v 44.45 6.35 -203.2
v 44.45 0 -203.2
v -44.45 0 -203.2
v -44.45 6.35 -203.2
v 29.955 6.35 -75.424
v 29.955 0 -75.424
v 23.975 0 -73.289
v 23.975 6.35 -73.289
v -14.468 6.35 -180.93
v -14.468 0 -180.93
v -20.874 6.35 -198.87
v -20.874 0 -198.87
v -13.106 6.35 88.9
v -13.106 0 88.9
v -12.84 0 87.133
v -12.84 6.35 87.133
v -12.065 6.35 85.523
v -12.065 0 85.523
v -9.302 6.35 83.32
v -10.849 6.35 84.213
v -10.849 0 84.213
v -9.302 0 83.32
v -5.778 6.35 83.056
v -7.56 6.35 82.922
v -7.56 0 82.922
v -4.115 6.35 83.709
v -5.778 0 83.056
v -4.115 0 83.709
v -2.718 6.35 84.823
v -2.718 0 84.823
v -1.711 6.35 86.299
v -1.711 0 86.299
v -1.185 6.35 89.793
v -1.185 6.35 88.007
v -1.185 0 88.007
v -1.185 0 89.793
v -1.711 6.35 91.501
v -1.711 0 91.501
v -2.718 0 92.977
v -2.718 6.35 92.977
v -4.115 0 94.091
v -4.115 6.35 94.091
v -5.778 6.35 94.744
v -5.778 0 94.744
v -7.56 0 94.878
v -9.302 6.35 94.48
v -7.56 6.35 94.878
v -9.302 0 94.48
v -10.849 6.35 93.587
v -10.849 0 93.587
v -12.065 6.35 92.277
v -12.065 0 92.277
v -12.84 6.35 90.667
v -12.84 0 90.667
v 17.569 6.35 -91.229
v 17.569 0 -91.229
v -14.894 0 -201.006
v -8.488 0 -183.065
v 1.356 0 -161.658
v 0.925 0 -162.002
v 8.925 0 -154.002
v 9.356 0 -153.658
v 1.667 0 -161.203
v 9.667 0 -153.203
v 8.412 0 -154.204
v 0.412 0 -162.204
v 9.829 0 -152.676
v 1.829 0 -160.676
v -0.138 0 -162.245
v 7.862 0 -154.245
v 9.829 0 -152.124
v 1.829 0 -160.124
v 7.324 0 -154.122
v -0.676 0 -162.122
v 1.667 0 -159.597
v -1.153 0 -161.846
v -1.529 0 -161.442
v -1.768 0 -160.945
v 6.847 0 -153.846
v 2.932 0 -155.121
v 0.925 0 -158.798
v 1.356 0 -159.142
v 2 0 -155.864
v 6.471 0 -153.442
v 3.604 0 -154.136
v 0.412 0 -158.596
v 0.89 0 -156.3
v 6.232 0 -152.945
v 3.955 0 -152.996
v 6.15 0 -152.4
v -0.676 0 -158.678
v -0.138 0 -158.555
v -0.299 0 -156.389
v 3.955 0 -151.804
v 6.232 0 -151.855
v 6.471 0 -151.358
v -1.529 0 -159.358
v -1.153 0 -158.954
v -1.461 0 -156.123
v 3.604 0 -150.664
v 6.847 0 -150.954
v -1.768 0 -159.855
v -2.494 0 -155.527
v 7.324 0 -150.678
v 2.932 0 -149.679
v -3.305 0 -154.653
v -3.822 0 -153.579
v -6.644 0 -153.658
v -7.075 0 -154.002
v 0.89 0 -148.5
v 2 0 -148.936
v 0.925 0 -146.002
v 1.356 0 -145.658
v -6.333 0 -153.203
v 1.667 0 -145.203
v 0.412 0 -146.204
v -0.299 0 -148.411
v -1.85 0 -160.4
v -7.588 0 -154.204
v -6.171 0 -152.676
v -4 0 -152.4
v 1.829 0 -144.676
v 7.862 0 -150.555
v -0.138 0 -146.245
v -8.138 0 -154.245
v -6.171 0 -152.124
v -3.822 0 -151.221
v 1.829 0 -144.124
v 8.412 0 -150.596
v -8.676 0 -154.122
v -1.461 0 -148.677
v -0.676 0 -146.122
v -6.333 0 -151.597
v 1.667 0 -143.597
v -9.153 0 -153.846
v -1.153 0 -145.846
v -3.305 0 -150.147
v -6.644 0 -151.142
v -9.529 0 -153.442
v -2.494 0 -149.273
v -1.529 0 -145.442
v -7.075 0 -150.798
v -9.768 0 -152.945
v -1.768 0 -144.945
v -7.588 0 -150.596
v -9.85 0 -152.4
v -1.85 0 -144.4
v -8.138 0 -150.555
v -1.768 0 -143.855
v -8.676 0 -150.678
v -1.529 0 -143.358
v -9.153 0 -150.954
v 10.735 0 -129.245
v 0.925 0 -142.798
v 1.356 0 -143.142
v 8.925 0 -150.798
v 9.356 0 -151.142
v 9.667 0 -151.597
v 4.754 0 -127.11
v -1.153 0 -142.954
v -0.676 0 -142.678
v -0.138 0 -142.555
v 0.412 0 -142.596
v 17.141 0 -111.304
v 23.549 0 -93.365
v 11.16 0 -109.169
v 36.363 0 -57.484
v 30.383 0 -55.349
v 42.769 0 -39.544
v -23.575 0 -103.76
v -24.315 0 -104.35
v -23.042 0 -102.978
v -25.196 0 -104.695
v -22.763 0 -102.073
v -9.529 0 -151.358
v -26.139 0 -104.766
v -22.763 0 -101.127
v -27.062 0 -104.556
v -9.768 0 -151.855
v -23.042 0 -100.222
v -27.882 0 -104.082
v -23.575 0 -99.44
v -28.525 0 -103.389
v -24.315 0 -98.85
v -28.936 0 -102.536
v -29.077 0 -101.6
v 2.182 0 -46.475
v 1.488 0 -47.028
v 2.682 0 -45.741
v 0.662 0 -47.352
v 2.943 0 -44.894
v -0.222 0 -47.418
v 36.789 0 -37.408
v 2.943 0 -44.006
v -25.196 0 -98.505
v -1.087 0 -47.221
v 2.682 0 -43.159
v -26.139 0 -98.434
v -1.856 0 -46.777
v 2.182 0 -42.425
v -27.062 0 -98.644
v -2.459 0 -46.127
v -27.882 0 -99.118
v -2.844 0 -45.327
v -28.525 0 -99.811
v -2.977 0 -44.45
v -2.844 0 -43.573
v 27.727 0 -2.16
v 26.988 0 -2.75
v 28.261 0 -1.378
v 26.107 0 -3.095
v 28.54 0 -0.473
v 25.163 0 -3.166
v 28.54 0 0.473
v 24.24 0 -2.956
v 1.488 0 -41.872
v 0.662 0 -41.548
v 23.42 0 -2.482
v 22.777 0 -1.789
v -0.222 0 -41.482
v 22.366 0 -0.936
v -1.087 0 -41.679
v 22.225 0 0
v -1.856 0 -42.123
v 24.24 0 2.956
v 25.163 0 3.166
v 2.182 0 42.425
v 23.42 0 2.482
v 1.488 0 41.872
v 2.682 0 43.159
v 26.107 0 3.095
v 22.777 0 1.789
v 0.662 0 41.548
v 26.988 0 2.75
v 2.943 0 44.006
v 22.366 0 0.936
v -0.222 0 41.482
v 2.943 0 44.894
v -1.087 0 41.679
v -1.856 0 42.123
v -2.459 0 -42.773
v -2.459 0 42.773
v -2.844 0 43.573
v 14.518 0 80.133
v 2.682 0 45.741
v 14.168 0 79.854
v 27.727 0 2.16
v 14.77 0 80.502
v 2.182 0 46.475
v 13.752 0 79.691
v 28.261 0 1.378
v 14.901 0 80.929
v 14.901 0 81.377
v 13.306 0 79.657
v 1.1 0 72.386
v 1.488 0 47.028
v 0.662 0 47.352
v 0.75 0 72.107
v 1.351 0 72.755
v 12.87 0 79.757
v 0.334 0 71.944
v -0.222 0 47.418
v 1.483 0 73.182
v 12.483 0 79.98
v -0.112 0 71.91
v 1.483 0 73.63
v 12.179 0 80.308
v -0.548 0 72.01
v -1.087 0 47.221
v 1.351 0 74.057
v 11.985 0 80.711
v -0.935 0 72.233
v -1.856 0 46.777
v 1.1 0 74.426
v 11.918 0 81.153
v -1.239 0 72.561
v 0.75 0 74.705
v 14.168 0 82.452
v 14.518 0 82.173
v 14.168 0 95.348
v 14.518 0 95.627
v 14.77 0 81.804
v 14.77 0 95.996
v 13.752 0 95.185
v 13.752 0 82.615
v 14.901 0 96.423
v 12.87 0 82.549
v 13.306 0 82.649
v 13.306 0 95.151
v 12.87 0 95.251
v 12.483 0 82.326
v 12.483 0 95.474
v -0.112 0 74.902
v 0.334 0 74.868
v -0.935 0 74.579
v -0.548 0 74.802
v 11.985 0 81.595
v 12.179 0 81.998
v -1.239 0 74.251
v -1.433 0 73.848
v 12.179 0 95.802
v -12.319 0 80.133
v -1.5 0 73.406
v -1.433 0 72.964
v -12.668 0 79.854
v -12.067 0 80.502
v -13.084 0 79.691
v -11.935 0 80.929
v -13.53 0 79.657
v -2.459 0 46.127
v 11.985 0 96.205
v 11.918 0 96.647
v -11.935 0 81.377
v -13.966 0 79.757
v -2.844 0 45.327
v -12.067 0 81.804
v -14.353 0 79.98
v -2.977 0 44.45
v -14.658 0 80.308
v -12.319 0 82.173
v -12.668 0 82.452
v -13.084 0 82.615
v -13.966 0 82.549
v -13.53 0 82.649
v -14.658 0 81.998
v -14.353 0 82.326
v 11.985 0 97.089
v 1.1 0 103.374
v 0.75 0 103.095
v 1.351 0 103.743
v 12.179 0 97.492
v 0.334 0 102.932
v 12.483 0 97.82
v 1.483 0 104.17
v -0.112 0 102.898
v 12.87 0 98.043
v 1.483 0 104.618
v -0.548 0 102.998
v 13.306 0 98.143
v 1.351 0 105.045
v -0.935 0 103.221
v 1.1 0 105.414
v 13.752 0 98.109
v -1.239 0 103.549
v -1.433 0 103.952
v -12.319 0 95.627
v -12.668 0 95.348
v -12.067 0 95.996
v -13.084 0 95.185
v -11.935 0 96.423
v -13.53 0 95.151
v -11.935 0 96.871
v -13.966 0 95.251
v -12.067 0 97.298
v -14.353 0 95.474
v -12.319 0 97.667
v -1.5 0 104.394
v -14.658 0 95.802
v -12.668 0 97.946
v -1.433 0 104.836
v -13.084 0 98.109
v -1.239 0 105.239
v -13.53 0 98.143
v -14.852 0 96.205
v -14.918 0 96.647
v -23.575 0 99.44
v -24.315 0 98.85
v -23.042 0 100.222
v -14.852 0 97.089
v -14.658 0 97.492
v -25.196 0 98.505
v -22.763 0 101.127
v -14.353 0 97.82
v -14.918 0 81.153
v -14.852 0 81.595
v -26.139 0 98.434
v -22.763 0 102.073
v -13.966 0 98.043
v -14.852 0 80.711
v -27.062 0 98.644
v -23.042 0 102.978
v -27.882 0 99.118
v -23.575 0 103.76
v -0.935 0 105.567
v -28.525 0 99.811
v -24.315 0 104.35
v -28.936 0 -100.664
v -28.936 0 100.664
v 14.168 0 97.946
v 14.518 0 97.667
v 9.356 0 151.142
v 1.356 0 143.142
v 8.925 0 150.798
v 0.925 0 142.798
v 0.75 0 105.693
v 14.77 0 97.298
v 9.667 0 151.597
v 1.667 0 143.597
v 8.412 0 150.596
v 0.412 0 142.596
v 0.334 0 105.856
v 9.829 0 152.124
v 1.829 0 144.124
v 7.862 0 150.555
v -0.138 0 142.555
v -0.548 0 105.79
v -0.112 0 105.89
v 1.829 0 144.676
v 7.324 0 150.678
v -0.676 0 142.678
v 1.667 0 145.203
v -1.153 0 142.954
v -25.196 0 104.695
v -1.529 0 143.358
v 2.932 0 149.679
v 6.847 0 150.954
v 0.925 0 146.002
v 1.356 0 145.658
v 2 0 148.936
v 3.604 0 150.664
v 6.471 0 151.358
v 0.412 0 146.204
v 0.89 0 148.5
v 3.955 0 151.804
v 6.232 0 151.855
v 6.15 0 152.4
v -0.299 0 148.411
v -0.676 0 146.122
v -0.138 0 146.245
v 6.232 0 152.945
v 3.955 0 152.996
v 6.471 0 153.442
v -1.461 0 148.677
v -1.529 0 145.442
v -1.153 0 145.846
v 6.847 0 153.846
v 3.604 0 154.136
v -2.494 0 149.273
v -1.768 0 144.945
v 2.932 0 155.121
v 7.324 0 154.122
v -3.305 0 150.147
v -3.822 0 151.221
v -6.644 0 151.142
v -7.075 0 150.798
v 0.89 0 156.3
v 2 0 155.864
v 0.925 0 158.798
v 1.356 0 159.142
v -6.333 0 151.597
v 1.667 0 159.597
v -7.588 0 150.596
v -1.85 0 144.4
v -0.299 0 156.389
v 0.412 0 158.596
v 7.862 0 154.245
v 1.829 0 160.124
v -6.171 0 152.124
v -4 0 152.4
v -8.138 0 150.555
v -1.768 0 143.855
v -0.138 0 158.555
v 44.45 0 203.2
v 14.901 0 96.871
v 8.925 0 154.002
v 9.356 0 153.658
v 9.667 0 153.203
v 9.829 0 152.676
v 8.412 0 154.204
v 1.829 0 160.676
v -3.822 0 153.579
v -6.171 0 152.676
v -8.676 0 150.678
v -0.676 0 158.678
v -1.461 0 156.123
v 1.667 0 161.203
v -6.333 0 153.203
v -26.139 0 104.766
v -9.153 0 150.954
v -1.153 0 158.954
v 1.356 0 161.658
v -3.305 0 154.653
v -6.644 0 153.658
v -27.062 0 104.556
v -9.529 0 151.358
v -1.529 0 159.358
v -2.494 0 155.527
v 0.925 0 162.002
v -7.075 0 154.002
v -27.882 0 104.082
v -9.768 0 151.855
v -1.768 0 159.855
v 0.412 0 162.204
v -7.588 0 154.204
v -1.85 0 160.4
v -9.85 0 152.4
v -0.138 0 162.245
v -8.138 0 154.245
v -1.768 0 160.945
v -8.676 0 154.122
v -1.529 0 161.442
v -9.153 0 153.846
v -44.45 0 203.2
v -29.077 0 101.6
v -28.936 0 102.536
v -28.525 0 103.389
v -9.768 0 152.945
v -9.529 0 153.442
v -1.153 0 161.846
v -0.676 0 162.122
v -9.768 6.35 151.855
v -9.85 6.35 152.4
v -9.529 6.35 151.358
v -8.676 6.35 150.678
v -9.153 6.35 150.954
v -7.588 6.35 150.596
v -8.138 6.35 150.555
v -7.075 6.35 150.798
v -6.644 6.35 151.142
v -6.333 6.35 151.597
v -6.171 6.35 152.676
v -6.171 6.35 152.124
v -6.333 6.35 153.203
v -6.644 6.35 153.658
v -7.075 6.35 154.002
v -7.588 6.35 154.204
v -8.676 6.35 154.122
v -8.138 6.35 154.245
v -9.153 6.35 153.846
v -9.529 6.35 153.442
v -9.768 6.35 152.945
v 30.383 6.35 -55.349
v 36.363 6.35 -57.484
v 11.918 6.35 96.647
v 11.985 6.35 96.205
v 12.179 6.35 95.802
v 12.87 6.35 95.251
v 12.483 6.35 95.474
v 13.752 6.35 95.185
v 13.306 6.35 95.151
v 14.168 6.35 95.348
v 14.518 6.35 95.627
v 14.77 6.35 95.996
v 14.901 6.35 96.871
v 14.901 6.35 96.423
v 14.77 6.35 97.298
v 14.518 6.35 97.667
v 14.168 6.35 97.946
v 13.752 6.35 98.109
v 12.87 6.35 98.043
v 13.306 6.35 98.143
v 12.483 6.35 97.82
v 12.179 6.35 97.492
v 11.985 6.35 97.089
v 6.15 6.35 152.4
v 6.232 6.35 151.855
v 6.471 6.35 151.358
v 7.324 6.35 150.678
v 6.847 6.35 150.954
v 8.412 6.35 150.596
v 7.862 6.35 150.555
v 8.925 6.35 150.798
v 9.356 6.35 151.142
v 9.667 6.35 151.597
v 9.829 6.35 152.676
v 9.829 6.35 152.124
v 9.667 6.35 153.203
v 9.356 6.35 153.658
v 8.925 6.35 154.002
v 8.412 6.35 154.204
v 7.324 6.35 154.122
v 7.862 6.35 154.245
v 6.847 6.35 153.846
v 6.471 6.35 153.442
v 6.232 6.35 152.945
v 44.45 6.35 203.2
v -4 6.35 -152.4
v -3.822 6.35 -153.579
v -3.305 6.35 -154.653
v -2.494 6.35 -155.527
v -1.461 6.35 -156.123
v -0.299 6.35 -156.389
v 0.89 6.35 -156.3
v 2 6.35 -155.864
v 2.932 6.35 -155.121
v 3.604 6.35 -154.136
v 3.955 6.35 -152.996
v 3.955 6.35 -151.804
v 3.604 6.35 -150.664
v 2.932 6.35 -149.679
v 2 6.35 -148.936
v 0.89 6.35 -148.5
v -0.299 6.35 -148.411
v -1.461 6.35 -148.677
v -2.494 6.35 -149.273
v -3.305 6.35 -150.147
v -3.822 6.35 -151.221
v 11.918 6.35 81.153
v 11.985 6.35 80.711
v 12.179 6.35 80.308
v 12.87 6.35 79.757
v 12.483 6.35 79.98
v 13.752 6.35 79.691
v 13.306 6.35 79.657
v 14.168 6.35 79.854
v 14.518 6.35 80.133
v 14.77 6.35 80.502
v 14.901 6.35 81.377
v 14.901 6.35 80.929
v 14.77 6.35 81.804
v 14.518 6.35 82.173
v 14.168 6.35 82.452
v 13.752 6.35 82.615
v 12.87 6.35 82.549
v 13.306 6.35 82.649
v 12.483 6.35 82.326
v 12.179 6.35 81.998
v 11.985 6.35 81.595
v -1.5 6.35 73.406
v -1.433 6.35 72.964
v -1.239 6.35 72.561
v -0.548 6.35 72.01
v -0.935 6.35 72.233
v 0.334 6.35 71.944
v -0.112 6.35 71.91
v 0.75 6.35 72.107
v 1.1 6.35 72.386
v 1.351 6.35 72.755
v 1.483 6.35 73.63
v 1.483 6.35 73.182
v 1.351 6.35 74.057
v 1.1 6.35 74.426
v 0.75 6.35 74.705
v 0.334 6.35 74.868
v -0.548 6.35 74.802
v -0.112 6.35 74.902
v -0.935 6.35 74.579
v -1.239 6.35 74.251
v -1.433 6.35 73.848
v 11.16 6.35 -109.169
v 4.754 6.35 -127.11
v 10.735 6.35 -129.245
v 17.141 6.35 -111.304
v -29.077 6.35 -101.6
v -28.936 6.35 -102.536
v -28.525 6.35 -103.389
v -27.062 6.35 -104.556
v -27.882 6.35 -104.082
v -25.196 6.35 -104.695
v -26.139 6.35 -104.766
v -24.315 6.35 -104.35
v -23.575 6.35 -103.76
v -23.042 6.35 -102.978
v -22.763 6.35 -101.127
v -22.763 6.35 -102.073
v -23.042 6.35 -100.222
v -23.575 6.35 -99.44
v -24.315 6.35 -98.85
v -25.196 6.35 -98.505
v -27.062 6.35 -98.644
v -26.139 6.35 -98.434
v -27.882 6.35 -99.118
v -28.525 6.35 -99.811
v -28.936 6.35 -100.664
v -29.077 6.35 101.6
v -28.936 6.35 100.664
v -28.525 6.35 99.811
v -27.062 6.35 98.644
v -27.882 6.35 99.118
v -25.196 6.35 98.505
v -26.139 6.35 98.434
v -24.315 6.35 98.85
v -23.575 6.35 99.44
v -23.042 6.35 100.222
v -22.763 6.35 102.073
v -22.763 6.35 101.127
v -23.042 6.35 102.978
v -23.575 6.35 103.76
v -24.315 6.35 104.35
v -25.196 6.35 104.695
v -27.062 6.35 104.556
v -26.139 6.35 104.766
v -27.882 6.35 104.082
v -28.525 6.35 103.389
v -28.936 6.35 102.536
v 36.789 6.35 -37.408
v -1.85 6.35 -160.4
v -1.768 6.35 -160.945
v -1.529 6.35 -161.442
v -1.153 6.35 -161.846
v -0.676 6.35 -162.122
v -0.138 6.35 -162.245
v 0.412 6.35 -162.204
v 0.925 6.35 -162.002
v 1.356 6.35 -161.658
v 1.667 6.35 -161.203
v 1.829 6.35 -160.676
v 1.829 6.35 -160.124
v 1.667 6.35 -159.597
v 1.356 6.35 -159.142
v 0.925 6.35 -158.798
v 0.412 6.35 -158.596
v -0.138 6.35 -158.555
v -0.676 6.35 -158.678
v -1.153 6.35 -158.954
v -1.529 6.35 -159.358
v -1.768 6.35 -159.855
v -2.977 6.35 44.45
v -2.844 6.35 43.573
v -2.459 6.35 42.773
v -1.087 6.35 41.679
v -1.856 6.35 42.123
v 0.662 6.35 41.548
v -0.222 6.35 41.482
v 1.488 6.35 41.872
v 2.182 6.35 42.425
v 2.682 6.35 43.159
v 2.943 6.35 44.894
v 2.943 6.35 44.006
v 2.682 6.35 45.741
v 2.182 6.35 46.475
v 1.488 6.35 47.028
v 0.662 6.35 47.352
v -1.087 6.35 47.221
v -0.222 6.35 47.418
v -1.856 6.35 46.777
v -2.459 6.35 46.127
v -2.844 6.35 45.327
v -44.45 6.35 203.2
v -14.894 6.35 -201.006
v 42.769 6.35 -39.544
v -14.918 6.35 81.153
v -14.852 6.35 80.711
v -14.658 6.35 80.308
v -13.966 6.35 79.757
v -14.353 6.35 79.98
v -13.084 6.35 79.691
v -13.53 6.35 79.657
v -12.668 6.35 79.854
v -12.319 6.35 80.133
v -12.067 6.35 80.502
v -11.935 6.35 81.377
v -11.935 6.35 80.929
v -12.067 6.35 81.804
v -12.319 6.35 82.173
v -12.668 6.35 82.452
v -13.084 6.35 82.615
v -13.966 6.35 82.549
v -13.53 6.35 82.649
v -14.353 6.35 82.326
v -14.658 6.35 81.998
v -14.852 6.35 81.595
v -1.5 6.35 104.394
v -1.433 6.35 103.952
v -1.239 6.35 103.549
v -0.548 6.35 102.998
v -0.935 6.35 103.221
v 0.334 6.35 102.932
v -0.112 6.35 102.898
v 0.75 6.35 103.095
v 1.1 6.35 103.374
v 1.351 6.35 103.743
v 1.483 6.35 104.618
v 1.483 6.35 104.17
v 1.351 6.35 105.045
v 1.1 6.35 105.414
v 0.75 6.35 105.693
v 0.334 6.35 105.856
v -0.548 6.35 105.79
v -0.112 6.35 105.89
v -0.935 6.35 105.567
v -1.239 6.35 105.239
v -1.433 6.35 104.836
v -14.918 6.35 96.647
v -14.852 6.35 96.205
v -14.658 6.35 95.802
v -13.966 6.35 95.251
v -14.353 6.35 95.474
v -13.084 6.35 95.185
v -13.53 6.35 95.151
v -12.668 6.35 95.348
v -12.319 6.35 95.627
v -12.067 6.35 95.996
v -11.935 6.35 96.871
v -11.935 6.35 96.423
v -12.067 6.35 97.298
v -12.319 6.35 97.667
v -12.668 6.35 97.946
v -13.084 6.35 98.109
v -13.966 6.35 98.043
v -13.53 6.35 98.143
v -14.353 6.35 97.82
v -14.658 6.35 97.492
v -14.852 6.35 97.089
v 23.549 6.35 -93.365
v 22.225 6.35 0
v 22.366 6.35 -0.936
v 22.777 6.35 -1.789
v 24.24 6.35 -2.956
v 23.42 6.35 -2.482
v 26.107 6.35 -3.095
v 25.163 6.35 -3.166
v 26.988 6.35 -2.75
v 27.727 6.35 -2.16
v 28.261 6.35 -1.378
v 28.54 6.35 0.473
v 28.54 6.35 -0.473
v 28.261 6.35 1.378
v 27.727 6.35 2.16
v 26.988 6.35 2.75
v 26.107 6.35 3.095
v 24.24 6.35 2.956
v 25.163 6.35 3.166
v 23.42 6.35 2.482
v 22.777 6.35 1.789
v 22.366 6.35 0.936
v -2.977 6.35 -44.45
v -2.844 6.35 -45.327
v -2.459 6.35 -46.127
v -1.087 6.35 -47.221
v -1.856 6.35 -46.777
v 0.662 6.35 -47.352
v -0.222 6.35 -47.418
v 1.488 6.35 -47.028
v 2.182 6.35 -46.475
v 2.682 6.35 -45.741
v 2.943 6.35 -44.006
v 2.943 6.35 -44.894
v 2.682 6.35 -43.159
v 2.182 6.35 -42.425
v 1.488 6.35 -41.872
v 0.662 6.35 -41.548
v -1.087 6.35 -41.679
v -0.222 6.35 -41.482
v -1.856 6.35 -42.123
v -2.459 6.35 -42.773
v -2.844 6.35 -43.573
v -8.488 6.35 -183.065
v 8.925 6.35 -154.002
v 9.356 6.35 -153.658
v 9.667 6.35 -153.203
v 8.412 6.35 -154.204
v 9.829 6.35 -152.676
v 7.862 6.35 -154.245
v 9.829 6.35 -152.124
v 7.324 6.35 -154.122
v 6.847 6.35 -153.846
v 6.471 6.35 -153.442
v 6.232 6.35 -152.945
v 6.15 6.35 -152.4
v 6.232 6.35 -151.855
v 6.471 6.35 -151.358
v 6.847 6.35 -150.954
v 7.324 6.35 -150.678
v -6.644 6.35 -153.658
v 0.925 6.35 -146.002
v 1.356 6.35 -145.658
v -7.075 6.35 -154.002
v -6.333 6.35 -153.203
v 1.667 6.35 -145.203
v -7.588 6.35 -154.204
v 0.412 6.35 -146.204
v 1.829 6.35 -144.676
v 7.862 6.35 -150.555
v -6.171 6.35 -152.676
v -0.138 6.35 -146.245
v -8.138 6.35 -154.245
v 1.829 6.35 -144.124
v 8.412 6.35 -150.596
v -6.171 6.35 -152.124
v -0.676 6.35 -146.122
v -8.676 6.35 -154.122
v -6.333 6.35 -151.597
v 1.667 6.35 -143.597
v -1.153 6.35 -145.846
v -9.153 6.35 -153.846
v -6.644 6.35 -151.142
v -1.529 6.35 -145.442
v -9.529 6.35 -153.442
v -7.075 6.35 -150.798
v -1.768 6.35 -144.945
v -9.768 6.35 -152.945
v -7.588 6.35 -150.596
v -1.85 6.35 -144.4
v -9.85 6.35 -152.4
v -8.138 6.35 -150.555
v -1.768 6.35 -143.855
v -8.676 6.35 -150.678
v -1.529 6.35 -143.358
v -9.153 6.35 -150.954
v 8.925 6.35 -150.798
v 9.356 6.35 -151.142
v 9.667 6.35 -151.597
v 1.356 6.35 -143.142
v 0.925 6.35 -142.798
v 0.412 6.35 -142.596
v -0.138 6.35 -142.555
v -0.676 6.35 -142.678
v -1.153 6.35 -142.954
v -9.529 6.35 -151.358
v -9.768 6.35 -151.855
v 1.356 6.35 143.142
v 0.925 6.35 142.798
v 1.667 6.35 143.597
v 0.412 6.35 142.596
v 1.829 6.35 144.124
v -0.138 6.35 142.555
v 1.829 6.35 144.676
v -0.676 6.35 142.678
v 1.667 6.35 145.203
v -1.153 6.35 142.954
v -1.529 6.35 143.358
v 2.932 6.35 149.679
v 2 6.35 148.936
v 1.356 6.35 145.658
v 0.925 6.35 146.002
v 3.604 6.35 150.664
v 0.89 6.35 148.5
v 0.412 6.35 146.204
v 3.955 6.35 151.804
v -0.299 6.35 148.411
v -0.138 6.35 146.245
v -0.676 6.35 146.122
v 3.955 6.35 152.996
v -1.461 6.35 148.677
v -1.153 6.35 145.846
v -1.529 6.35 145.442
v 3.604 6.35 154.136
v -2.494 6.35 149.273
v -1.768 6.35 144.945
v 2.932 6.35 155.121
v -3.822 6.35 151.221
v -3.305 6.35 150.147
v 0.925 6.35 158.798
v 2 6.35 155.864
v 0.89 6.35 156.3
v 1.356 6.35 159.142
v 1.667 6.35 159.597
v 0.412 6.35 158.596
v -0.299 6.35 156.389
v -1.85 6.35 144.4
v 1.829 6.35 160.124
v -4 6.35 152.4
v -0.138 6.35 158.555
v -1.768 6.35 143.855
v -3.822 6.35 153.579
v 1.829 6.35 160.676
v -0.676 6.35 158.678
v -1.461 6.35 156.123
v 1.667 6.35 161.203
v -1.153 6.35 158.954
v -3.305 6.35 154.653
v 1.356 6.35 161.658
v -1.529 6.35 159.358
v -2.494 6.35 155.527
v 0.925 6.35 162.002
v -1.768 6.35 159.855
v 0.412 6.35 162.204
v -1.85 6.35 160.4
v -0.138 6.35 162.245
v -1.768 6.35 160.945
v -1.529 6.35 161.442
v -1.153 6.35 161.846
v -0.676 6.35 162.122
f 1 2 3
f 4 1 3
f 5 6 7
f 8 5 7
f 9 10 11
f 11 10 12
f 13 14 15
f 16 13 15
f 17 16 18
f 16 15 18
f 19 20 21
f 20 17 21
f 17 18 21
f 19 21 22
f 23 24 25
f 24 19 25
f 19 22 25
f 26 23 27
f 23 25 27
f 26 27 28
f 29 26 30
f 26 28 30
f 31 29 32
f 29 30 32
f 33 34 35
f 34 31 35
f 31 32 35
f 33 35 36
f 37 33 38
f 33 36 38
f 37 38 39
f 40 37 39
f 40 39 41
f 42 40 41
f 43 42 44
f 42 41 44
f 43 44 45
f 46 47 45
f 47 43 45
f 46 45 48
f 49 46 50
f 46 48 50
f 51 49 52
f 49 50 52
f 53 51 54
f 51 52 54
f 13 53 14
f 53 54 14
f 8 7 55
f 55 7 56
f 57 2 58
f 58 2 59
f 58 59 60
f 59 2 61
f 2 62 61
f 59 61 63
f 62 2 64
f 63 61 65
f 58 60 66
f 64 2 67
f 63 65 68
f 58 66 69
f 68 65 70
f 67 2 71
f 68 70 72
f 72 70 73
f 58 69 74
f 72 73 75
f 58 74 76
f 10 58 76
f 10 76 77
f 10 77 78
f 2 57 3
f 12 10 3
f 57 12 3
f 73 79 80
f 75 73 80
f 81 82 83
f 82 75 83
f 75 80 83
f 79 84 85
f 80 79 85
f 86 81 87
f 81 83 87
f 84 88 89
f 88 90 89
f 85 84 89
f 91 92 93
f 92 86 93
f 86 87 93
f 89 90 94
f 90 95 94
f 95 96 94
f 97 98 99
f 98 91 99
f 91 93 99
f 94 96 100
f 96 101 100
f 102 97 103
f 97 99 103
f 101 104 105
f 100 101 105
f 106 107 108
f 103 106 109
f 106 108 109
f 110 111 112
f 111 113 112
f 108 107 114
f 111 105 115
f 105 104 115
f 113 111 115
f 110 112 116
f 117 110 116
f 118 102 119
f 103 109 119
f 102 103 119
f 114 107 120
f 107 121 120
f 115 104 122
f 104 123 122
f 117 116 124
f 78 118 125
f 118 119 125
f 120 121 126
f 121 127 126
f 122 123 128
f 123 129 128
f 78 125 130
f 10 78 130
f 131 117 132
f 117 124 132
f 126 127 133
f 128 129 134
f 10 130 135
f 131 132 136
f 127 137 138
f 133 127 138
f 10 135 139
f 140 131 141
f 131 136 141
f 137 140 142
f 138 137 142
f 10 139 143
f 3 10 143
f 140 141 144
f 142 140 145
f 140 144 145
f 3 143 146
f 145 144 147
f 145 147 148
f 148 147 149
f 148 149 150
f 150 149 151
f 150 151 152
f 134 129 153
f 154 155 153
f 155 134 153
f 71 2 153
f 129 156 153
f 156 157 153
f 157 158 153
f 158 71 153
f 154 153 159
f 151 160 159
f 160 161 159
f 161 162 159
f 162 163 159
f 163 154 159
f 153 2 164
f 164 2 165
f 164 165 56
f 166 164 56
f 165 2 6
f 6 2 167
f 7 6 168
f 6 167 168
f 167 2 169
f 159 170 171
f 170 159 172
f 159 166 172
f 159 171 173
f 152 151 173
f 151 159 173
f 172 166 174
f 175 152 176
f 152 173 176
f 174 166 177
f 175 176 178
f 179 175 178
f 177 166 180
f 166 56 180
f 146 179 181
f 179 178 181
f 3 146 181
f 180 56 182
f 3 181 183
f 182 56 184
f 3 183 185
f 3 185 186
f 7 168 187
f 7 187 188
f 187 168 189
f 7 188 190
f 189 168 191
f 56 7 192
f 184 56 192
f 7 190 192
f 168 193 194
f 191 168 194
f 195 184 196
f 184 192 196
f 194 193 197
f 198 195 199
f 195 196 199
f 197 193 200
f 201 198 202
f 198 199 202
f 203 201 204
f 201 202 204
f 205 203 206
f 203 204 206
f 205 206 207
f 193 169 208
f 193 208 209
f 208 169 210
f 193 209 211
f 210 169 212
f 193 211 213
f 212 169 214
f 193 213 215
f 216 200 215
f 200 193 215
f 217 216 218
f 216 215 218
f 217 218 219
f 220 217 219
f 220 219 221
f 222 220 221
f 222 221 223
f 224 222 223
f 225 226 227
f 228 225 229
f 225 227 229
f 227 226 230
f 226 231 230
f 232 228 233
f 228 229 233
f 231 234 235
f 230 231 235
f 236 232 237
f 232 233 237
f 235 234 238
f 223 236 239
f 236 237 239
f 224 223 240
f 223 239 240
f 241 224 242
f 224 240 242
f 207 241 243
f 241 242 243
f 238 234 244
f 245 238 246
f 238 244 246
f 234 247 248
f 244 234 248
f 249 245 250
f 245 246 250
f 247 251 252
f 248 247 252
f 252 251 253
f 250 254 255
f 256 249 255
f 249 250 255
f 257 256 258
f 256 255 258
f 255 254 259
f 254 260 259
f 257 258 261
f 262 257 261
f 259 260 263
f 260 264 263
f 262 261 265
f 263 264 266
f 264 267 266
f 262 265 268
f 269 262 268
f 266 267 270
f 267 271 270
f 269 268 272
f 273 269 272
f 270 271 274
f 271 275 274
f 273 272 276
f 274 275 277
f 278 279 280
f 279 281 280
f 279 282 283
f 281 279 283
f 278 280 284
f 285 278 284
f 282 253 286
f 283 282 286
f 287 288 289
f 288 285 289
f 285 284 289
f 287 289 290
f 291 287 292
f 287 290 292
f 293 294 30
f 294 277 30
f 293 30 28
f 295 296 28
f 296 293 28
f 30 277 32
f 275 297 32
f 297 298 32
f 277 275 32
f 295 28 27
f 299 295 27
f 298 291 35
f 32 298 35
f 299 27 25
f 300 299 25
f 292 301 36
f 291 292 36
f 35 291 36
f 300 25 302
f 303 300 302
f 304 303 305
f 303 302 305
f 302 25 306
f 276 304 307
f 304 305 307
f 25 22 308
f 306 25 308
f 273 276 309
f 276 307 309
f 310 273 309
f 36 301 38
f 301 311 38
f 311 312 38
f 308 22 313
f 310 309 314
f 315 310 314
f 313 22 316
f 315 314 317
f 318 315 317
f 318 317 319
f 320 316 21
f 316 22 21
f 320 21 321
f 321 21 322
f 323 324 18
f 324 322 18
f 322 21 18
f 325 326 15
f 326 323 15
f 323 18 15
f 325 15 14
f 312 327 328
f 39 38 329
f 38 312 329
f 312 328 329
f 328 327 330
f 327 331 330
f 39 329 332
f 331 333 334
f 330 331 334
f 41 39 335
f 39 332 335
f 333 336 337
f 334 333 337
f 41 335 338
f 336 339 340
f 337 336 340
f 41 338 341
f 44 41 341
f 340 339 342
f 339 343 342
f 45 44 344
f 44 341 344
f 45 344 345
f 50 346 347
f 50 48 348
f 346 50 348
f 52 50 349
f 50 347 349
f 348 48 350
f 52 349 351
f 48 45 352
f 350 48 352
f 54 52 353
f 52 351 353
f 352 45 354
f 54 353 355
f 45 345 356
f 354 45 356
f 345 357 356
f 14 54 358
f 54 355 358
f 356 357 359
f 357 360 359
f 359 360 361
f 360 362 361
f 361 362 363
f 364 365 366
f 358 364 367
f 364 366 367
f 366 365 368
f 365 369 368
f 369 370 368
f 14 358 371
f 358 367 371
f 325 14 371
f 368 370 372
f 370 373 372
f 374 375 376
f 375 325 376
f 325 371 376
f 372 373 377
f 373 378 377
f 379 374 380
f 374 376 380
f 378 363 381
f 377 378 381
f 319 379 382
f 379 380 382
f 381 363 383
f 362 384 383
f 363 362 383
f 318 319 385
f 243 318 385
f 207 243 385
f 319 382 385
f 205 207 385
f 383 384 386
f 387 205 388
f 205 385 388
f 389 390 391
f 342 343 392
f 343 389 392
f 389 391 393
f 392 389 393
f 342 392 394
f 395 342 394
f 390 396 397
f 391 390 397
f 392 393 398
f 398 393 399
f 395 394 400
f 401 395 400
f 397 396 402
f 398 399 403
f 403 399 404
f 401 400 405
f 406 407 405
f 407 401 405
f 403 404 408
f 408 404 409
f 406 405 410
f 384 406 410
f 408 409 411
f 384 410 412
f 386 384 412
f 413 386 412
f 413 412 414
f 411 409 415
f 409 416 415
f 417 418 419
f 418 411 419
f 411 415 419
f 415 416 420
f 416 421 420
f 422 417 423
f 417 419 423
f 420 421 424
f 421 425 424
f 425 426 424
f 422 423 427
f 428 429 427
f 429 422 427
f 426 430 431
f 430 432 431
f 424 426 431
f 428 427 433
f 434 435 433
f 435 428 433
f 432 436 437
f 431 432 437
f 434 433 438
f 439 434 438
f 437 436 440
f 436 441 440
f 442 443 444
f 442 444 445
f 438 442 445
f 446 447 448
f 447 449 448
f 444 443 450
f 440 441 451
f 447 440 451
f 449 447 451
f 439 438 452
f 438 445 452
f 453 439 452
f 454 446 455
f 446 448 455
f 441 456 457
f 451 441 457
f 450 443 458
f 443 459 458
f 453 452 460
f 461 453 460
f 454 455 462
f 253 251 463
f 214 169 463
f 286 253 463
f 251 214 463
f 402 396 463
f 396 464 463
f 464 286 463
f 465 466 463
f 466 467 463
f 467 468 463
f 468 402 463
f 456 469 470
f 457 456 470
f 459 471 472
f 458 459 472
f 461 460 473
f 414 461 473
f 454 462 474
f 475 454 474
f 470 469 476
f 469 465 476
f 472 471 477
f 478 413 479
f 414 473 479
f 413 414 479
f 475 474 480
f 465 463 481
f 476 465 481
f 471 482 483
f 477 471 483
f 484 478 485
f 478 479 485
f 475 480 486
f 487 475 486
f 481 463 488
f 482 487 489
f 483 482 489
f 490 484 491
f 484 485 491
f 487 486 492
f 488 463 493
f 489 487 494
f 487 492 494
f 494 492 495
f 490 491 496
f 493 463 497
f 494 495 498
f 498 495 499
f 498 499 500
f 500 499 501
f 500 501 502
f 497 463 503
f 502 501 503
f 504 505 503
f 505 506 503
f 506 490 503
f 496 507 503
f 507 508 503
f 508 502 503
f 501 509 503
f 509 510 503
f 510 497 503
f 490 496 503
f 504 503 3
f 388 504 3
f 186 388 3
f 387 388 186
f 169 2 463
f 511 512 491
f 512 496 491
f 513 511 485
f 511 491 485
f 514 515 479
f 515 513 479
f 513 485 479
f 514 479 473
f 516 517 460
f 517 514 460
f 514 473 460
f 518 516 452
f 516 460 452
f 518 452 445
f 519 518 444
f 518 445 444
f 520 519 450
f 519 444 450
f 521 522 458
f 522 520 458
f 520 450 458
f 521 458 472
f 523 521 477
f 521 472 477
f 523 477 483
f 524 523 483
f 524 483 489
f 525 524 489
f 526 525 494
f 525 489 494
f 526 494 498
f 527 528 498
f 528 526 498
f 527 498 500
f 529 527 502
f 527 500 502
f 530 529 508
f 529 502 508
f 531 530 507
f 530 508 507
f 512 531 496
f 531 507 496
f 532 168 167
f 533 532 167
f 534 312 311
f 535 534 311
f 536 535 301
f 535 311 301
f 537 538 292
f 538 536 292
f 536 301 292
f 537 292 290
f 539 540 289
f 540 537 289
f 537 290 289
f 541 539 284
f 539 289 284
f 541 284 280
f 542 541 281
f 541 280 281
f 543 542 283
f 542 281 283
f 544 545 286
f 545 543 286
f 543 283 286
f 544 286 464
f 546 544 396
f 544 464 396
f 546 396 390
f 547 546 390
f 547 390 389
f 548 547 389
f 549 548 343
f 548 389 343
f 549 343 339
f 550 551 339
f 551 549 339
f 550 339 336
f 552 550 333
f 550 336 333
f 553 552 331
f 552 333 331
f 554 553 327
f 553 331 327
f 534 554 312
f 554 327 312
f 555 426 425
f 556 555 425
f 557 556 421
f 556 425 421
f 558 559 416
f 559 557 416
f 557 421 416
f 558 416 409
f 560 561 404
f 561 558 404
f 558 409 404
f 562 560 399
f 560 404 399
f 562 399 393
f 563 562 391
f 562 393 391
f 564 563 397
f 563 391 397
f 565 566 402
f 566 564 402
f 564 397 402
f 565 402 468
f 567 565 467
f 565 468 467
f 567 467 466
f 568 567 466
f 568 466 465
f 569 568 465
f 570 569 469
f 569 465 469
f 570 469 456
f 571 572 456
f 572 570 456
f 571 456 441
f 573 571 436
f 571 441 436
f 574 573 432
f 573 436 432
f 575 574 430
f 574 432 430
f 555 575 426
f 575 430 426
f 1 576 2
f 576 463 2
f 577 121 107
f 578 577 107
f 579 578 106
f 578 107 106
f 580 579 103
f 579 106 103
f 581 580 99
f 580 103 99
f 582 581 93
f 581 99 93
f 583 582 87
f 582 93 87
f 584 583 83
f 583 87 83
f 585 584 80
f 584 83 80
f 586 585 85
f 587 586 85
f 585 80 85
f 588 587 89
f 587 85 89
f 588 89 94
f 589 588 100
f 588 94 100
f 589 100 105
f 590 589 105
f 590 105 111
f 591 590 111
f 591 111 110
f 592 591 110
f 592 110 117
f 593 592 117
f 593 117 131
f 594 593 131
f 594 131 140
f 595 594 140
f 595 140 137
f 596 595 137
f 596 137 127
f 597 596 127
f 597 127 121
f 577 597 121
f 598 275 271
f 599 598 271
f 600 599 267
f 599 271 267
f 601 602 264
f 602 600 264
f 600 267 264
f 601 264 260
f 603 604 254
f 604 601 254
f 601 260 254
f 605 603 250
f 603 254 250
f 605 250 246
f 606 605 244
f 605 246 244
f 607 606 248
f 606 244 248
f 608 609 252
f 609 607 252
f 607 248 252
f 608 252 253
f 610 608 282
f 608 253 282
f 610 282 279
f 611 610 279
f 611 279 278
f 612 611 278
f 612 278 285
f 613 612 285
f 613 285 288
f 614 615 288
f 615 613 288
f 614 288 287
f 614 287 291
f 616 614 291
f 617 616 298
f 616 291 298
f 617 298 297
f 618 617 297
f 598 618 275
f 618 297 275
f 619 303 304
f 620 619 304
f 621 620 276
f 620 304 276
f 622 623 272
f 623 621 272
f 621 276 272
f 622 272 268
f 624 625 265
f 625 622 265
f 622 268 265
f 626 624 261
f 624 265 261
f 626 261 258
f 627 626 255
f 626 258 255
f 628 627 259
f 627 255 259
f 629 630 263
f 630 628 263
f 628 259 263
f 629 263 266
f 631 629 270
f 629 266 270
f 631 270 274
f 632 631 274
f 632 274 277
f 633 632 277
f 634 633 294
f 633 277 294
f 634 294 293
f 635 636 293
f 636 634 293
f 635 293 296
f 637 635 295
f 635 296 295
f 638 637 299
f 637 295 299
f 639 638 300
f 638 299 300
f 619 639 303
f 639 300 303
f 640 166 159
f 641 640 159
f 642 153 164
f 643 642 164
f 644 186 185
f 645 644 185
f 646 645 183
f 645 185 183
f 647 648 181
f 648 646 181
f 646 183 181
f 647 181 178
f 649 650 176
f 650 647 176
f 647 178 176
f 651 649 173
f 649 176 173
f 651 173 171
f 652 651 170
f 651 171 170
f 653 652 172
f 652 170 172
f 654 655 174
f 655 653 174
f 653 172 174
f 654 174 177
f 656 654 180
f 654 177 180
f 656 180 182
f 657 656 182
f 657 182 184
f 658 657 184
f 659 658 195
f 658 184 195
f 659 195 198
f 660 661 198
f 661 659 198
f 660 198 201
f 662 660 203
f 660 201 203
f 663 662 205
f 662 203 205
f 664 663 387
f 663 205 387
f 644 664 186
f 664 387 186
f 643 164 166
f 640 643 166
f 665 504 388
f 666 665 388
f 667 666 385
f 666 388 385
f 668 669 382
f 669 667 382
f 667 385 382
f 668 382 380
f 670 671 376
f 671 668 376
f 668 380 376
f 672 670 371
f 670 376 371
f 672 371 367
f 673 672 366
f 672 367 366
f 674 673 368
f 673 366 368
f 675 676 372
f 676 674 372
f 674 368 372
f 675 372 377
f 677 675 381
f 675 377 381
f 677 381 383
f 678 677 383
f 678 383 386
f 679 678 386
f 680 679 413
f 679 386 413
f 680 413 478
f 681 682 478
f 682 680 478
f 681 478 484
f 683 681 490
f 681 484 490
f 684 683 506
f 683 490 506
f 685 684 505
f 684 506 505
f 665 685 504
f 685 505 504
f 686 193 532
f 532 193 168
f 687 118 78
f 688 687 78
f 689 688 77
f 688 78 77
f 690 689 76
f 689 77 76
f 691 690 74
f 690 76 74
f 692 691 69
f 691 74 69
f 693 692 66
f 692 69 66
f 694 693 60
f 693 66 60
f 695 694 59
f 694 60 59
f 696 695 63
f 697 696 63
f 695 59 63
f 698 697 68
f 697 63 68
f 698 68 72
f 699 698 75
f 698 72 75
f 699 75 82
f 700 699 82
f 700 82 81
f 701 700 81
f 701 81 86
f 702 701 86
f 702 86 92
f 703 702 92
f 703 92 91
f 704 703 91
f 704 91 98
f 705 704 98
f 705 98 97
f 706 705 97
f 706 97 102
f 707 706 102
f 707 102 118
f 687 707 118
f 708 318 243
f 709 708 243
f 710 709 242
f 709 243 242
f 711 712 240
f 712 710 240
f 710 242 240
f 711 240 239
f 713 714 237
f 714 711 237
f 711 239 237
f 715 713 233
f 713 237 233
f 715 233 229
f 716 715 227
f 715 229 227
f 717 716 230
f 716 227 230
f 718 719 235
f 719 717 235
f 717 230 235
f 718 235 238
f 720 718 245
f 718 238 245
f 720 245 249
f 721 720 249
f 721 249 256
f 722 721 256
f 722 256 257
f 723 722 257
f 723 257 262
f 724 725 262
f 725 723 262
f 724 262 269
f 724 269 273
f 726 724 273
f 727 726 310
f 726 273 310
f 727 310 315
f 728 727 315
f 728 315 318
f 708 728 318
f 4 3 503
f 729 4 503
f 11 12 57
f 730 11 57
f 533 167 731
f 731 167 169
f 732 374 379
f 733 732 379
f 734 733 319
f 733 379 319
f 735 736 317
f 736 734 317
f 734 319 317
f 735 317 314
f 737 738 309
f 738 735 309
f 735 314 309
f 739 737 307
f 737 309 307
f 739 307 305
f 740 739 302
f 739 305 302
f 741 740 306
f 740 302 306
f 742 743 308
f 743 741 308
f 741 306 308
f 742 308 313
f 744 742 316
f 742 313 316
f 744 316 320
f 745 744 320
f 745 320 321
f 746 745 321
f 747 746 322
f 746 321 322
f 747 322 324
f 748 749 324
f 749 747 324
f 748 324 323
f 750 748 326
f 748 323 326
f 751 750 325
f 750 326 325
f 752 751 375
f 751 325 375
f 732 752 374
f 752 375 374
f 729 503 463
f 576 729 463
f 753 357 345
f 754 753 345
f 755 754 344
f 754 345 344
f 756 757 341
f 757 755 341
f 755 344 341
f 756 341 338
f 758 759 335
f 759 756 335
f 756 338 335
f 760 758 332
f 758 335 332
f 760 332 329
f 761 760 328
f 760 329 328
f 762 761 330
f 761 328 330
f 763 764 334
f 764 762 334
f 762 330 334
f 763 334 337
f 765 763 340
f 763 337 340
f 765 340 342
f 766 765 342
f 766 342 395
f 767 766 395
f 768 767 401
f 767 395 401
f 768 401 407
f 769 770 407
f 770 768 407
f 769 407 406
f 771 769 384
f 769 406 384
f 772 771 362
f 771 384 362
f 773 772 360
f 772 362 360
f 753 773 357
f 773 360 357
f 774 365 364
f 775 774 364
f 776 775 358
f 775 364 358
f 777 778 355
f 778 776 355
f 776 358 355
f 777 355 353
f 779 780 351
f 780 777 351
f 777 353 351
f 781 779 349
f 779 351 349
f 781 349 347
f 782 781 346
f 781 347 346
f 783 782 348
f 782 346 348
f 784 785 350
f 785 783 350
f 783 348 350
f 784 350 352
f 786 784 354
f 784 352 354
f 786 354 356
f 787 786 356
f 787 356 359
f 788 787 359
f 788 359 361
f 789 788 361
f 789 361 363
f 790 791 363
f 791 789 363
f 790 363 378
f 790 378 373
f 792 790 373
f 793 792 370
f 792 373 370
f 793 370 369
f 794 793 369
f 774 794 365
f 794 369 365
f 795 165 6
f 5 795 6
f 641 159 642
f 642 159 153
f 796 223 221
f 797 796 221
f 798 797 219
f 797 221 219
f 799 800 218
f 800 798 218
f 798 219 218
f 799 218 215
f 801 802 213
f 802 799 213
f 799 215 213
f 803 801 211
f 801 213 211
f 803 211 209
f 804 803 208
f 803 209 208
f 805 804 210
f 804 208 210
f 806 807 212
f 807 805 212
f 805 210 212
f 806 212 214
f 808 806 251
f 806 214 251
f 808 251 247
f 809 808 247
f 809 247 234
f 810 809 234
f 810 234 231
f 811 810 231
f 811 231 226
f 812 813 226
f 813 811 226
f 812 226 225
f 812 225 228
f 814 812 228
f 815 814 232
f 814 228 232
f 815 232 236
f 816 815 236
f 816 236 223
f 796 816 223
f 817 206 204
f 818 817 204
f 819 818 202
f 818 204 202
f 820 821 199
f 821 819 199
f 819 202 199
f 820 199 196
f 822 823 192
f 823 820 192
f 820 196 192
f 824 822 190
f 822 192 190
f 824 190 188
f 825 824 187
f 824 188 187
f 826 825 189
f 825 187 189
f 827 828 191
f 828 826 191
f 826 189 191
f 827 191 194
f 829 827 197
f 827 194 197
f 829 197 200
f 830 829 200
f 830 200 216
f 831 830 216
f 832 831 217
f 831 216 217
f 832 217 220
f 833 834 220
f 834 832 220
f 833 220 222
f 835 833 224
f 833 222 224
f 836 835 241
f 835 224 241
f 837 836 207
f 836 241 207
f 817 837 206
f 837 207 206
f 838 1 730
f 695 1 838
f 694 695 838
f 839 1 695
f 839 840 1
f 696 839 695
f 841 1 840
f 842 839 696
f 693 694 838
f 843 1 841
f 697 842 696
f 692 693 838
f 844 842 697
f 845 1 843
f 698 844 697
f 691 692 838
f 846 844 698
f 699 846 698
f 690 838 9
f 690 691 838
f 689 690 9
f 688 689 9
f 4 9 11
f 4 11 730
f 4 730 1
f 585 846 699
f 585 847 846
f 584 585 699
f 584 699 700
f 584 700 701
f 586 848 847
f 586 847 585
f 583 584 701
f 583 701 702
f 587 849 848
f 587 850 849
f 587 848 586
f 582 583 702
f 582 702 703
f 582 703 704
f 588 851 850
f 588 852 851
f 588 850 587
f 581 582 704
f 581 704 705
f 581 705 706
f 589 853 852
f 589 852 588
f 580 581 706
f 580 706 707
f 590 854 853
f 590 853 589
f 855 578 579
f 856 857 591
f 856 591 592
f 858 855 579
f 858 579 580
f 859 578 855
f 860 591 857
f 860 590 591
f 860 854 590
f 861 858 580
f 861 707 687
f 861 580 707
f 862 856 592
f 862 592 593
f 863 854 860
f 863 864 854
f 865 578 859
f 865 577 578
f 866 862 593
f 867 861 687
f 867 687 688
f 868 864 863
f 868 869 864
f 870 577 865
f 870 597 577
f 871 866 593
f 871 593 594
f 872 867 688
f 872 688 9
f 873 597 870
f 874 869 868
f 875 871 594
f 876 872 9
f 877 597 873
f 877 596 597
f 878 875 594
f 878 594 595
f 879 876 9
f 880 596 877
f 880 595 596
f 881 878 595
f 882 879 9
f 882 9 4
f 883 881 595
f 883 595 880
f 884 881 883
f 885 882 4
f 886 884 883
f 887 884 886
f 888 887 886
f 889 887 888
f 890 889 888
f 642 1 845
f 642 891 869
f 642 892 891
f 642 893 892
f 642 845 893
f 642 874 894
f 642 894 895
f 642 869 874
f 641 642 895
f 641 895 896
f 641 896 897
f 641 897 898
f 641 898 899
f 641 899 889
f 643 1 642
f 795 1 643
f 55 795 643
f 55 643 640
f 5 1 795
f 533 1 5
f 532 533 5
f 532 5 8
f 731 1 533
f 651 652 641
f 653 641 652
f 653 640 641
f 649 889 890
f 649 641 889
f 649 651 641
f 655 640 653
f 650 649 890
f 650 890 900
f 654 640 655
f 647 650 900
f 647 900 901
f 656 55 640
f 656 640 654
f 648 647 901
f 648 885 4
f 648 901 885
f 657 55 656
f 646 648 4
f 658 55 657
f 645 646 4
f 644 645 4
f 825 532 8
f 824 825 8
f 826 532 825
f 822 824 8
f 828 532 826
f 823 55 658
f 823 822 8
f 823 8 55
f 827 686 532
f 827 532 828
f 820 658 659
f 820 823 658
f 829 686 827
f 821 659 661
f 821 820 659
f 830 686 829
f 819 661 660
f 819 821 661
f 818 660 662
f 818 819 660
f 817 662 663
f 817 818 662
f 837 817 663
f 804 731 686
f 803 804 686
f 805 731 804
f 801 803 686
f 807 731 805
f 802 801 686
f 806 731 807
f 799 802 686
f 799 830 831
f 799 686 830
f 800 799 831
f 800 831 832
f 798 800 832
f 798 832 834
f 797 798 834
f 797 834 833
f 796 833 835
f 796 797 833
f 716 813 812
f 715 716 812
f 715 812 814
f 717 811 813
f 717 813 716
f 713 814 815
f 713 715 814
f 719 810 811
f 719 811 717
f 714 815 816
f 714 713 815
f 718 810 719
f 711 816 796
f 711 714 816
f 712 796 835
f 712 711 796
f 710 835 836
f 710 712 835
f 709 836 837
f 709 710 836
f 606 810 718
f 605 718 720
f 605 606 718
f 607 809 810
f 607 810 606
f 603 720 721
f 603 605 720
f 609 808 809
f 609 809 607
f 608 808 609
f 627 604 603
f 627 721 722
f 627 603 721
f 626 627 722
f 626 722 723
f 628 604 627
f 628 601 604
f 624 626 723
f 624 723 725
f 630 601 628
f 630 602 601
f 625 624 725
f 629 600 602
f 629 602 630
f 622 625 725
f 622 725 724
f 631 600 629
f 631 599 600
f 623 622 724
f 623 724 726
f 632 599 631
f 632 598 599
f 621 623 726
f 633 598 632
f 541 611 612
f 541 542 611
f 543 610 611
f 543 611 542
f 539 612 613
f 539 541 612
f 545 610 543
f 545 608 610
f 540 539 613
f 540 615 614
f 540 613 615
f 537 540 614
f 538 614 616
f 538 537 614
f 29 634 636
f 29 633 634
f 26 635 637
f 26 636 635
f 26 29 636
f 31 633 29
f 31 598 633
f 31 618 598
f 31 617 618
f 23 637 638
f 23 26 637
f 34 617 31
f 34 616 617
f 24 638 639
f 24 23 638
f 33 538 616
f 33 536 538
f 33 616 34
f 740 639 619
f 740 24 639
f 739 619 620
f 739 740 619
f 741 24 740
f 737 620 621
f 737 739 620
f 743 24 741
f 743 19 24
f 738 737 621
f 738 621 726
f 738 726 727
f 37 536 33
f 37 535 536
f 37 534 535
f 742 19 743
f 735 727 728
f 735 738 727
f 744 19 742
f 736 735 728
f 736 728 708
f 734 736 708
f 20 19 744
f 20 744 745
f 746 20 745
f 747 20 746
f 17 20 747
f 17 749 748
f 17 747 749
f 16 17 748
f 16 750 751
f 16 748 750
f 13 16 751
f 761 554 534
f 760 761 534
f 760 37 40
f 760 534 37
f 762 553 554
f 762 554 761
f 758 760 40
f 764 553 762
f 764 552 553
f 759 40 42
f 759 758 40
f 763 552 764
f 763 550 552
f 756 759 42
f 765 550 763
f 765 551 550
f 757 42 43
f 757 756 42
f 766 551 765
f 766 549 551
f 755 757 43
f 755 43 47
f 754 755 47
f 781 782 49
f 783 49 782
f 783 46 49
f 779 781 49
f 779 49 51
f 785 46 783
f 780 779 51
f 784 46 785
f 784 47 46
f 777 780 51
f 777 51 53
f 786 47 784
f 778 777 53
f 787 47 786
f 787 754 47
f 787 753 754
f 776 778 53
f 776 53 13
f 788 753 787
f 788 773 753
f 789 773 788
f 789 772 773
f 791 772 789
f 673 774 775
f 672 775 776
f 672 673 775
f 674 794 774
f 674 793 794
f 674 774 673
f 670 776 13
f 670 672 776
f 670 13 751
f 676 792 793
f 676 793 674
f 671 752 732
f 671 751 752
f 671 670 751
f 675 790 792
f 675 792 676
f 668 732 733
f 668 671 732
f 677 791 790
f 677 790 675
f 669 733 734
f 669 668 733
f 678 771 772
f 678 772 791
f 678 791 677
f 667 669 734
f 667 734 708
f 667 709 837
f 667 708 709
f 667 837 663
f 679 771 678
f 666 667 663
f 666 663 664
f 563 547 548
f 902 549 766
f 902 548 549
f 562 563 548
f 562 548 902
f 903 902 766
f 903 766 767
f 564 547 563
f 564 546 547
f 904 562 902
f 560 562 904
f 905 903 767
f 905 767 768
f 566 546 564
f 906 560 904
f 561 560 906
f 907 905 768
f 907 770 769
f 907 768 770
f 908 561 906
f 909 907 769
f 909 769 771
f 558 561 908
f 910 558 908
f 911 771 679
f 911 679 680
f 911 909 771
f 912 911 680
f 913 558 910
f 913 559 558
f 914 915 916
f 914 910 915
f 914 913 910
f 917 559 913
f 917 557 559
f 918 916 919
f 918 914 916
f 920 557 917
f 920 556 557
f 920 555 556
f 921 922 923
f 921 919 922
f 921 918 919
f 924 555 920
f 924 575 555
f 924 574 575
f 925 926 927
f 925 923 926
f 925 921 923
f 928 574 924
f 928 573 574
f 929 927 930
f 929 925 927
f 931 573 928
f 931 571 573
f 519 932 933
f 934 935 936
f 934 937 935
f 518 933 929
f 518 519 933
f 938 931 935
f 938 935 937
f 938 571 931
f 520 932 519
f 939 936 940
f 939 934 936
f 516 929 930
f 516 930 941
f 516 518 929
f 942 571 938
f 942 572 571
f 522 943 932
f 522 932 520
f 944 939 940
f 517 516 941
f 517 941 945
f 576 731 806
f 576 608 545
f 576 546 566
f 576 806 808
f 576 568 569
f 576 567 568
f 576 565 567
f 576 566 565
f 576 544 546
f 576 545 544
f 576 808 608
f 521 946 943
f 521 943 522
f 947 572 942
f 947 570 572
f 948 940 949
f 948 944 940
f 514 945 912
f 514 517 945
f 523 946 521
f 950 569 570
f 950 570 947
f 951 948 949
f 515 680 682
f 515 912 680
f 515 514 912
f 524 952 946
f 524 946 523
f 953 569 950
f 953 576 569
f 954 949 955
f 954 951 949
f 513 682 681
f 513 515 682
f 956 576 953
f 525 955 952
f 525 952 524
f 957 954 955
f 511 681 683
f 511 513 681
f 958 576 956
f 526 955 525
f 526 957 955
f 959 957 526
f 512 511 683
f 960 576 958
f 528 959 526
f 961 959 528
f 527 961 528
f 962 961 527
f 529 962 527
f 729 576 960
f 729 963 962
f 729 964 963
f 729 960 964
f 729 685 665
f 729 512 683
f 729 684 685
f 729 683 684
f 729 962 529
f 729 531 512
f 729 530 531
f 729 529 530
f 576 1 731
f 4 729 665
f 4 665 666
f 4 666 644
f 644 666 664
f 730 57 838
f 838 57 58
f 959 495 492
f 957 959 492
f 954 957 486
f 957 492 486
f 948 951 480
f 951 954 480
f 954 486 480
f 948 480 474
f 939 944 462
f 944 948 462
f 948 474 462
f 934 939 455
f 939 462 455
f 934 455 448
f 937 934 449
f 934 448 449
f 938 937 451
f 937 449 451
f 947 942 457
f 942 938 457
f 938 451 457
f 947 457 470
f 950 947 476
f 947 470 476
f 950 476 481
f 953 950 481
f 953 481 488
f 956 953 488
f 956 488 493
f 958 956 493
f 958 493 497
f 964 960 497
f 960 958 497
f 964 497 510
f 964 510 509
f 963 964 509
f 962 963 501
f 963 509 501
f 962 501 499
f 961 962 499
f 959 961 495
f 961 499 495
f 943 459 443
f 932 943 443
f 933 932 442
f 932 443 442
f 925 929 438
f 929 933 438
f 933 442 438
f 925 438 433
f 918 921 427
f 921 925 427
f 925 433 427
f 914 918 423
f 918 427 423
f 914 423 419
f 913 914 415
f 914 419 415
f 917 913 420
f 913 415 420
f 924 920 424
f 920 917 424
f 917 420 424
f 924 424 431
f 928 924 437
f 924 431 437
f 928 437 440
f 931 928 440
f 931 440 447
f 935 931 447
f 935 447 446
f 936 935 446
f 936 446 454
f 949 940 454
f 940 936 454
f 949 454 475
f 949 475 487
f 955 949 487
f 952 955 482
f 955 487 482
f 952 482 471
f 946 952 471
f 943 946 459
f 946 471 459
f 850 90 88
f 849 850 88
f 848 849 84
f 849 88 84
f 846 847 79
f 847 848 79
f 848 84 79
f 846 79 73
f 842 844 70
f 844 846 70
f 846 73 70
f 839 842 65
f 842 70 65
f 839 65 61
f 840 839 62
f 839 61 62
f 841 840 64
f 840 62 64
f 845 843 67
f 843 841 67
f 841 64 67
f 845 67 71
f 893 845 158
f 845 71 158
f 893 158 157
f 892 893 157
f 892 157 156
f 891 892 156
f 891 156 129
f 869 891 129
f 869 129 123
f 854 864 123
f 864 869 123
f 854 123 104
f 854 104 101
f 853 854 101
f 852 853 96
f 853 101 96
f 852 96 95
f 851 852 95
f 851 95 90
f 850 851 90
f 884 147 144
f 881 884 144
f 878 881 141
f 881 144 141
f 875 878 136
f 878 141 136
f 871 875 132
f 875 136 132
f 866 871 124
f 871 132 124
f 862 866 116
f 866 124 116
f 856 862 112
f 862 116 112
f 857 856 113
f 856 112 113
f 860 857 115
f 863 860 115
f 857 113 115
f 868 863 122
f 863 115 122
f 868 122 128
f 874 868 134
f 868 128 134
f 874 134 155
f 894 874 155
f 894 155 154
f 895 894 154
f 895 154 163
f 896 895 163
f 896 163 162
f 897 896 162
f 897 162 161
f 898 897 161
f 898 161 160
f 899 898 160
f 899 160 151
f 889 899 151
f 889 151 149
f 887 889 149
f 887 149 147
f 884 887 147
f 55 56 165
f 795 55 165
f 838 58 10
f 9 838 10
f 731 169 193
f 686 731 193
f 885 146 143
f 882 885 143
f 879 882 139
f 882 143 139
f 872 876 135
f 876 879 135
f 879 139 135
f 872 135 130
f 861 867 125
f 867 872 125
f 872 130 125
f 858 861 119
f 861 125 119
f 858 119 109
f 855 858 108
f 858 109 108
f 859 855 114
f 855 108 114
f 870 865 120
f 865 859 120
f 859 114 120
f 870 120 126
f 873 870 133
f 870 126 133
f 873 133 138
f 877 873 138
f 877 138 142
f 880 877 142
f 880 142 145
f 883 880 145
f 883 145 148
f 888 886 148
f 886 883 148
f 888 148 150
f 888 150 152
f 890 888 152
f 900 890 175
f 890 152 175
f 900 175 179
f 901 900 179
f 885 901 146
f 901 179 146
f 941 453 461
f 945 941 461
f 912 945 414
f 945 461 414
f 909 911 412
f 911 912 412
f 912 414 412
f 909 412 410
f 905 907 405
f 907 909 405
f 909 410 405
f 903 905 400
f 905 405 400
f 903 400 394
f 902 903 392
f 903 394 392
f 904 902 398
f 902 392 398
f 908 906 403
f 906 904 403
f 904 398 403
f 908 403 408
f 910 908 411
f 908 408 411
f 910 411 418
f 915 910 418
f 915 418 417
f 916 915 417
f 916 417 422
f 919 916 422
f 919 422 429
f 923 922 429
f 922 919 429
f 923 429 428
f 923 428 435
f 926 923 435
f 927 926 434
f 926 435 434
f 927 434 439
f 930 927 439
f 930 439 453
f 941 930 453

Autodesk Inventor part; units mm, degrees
ref_plane "YZ Plane" through (0, 0, 0) normal (1, 0, 0) x (0, 1, 0)
ref_plane "XZ Plane" through (0, 0, 0) normal (0, 1, 0) x (-1, 0, 0)
ref_plane "XY Plane" through (0, 0, 0) normal (0, 0, 1) x (1, 0, 0)
sketch "Sketch1" plane through (0, 0, 0) normal (0, 1, 0) x (-1, 0, 0)
  line L0 (-44.45, -203.2) -> (44.45, -203.2)
  line L1 (44.45, -203.2) -> (44.45, 203.2)
  line L2 (44.45, 203.2) -> (-44.45, 203.2)
  line L3 (-44.45, 203.2) -> (-44.45, -203.2)
  line L4 (-44.45, -203.2) -> (44.45, 203.2) construction
  line L5 (44.45, -203.2) -> (-44.45, 203.2) construction
  line L6 (0, 203.2) -> (0, -203.2) construction
  line L7 (0, 0) -> (44.45, 0) construction
  line L8 (0, -203.2) -> (0, 203.2) construction
  line L9 (0, 152.4) -> (7.112, 152.4) construction
  line L10 (0, -152.4) -> (0, -203.2) construction
  circle A0 centre (0, -152.4) radius 4
  circle A1 centre (0, -152.4) radius 8 construction
  line L11 (0, 152.4) -> (-44.45, 152.4) construction
  line L12 (-44.45, 152.4) -> (-44.45, 88.9)
  line L13 (-44.45, 88.9) -> (0, 88.9) construction
  line L14 (0, 88.9) -> (0, 152.4) construction
  circle A2 centre (0, 88.9) radius 7.112 construction
  circle A3 centre (7.112, 88.9) radius 5.9944
  circle A4 centre (0, 88.9) radius 15.494 construction
  circle A5 centre (0, 104.394) radius 1.5
  circle A6 centre (0, 88.9) radius 15.494 construction
  circle A7 centre (-13.4182, 96.647) radius 1.5
  circle A8 centre (0, 88.9) radius 15.494 construction
  circle A9 centre (-13.4182, 81.153) radius 1.5
  circle A10 centre (0, 88.9) radius 15.494 construction
  circle A11 centre (0, 73.406) radius 1.5
  circle A12 centre (0, 88.9) radius 15.494 construction
  circle A13 centre (13.4182, 81.153) radius 1.5
  circle A14 centre (0, 88.9) radius 15.494 construction
  circle A15 centre (13.4182, 96.647) radius 1.5
  circle A16 centre (0, -144.4) radius 1.85
  circle A17 centre (-8, -152.4) radius 1.85
  circle A18 centre (0, -160.4) radius 1.85
  circle A19 centre (8, -152.4) radius 1.85
  circle A20 centre (0, 152.4) radius 4
  circle A21 centre (0, 152.4) radius 8 construction
  circle A22 centre (0, 160.4) radius 1.85
  circle A23 centre (0, 152.4) radius 8 construction
  circle A24 centre (-8, 152.4) radius 1.85
  circle A25 centre (0, 152.4) radius 8 construction
  circle A26 centre (0, 144.4) radius 1.85
  circle A27 centre (0, 152.4) radius 8 construction
  circle A28 centre (8, 152.4) radius 1.85
  line L15 (-88.9, 44.45) -> (0, 44.45) construction
  line L16 (0, 44.45) -> (0, -44.45) construction
  line L17 (0, -44.45) -> (-88.9, -44.45) construction
  line L18 (-88.9, -44.45) -> (-88.9, 44.45) construction
  line L19 (-88.9, 44.45) -> (0, -44.45) construction
  line L20 (0, 44.45) -> (-88.9, -44.45) construction
  circle A29 centre (0, 44.45) radius 2.9766
  circle A30 centre (0, -44.45) radius 2.9766
  line L21 (44.45, -203.2) -> (25.4, -203.2)
  line L22 (25.4, -203.2) -> (25.4, -101.6) construction
  line L23 (25.4, -101.6) -> (44.45, -101.6) construction
  line L24 (44.45, -101.6) -> (44.45, -203.2)
  circle A31 centre (25.9021, -101.6) radius 3.175
  circle A32 centre (25.9021, 101.6) radius 3.175
  line L25 (-44.45, -17.5714) -> (-25.4, -17.5714) construction
  line L26 (-25.4, -17.5714) -> (-25.4, 31.4423) construction
  line L27 (-25.4, 31.4423) -> (-44.45, 31.4423) construction
  line L28 (-44.45, 31.4423) -> (-44.45, -17.5714)
  circle A33 centre (-25.4, 0) radius 3.175
  line L29 (-44.45, -203.2) -> (0, -203.2)
  line L30 (-44.45, 0) -> (-44.45, -203.2)
  line L31 (-44.45, -203.2) -> (19.05, -203.2)
  line L32 (19.05, -203.2) -> (19.05, -25.4) construction
  line L33 (19.05, -25.4) -> (-44.45, -25.4) construction
  line L34 (-44.45, -25.4) -> (-44.45, -203.2)
  line L35 (19.05, -203.2) -> (-44.45, -25.4) construction
  line L36 (-44.45, -25.4) -> (-38.0428, -43.3402) construction
  line L37 (-30.3832, -55.3489) -> (-36.3634, -57.4842)
  line L38 (-36.3634, -57.4842) -> (-42.7694, -39.5436)
  line L39 (-42.7694, -39.5436) -> (-36.7892, -37.4083)
  line L40 (-36.7892, -37.4083) -> (-30.3832, -55.3489)
  line L41 (-41.2178, -33.8152) -> (-34.8678, -52.8652) construction
  line L42 (-34.8678, -33.8152) -> (-41.2178, -52.8652) construction
  line L43 (-23.549, -93.3646) -> (-29.955, -75.424)
  line L44 (-17.5688, -91.2293) -> (-23.549, -93.3646)
  line L45 (-23.9748, -73.2887) -> (-17.5688, -91.2293)
  line L46 (-29.955, -75.424) -> (-23.9748, -73.2887)
  line L47 (-10.7346, -129.245) -> (-17.1406, -111.3044)
  line L48 (-4.7544, -127.1096) -> (-10.7346, -129.245)
  line L49 (-11.1604, -109.169) -> (-4.7544, -127.1096)
  line L50 (-17.1406, -111.3044) -> (-11.1604, -109.169)
  line L51 (2.0798, -165.1253) -> (-4.3262, -147.1847)
  line L52 (8.06, -162.99) -> (2.0798, -165.1253)
  line L53 (1.654, -145.0494) -> (8.06, -162.99)
  line L54 (-4.3262, -147.1847) -> (1.654, -145.0494)
  line L55 (14.8942, -201.0057) -> (8.4882, -183.0651)
  line L56 (20.8744, -198.8704) -> (14.8942, -201.0057)
  line L57 (14.4684, -180.9298) -> (20.8744, -198.8704)
  line L58 (8.4882, -183.0651) -> (14.4684, -180.9298)
  dimension "d17" = 16
  dimension "d26" = 14.224
  dimension "d28" = 30.988
  dimension "d40" = 16
  dimension "d0" = 406.4
  dimension "d1" = 88.9
  dimension "d2" = 152.4
  dimension "d16" = 8
  dimension "d24" = 44.45
  dimension "d25" = 63.5
  dimension "d27" = 11.9888
  dimension "d29" = 3
  dimension "d32" = 360
  dimension "d34" = 3.7
  dimension "d37" = 360
  dimension "d39" = 8
  dimension "d41" = 3.7
  dimension "d44" = 360
  dimension "d63" = 88.9
  dimension "d64" = 5.9531
  dimension "d65" = 5.9531
  dimension "d71" = 101.6
  dimension "d72" = 19.05
  dimension "d73" = 6.35
  dimension "d74" = 19.05
  dimension "d75" = 6.35
  dimension "d81" = 177.8
  dimension "d82" = 63.5
  dimension "d83" = 19.05
  dimension "d84" = 6.35
  dimension "d85" = 19.05
  dimension "d88" = 38.1
extrude "Extrusion8" add sketch "Sketch1" along normal blind 6.35 contours L3 L2 L1 L0 | A0 L51 L54 A16 L53 L52 A18
properties part number "testPart_chassis2"
